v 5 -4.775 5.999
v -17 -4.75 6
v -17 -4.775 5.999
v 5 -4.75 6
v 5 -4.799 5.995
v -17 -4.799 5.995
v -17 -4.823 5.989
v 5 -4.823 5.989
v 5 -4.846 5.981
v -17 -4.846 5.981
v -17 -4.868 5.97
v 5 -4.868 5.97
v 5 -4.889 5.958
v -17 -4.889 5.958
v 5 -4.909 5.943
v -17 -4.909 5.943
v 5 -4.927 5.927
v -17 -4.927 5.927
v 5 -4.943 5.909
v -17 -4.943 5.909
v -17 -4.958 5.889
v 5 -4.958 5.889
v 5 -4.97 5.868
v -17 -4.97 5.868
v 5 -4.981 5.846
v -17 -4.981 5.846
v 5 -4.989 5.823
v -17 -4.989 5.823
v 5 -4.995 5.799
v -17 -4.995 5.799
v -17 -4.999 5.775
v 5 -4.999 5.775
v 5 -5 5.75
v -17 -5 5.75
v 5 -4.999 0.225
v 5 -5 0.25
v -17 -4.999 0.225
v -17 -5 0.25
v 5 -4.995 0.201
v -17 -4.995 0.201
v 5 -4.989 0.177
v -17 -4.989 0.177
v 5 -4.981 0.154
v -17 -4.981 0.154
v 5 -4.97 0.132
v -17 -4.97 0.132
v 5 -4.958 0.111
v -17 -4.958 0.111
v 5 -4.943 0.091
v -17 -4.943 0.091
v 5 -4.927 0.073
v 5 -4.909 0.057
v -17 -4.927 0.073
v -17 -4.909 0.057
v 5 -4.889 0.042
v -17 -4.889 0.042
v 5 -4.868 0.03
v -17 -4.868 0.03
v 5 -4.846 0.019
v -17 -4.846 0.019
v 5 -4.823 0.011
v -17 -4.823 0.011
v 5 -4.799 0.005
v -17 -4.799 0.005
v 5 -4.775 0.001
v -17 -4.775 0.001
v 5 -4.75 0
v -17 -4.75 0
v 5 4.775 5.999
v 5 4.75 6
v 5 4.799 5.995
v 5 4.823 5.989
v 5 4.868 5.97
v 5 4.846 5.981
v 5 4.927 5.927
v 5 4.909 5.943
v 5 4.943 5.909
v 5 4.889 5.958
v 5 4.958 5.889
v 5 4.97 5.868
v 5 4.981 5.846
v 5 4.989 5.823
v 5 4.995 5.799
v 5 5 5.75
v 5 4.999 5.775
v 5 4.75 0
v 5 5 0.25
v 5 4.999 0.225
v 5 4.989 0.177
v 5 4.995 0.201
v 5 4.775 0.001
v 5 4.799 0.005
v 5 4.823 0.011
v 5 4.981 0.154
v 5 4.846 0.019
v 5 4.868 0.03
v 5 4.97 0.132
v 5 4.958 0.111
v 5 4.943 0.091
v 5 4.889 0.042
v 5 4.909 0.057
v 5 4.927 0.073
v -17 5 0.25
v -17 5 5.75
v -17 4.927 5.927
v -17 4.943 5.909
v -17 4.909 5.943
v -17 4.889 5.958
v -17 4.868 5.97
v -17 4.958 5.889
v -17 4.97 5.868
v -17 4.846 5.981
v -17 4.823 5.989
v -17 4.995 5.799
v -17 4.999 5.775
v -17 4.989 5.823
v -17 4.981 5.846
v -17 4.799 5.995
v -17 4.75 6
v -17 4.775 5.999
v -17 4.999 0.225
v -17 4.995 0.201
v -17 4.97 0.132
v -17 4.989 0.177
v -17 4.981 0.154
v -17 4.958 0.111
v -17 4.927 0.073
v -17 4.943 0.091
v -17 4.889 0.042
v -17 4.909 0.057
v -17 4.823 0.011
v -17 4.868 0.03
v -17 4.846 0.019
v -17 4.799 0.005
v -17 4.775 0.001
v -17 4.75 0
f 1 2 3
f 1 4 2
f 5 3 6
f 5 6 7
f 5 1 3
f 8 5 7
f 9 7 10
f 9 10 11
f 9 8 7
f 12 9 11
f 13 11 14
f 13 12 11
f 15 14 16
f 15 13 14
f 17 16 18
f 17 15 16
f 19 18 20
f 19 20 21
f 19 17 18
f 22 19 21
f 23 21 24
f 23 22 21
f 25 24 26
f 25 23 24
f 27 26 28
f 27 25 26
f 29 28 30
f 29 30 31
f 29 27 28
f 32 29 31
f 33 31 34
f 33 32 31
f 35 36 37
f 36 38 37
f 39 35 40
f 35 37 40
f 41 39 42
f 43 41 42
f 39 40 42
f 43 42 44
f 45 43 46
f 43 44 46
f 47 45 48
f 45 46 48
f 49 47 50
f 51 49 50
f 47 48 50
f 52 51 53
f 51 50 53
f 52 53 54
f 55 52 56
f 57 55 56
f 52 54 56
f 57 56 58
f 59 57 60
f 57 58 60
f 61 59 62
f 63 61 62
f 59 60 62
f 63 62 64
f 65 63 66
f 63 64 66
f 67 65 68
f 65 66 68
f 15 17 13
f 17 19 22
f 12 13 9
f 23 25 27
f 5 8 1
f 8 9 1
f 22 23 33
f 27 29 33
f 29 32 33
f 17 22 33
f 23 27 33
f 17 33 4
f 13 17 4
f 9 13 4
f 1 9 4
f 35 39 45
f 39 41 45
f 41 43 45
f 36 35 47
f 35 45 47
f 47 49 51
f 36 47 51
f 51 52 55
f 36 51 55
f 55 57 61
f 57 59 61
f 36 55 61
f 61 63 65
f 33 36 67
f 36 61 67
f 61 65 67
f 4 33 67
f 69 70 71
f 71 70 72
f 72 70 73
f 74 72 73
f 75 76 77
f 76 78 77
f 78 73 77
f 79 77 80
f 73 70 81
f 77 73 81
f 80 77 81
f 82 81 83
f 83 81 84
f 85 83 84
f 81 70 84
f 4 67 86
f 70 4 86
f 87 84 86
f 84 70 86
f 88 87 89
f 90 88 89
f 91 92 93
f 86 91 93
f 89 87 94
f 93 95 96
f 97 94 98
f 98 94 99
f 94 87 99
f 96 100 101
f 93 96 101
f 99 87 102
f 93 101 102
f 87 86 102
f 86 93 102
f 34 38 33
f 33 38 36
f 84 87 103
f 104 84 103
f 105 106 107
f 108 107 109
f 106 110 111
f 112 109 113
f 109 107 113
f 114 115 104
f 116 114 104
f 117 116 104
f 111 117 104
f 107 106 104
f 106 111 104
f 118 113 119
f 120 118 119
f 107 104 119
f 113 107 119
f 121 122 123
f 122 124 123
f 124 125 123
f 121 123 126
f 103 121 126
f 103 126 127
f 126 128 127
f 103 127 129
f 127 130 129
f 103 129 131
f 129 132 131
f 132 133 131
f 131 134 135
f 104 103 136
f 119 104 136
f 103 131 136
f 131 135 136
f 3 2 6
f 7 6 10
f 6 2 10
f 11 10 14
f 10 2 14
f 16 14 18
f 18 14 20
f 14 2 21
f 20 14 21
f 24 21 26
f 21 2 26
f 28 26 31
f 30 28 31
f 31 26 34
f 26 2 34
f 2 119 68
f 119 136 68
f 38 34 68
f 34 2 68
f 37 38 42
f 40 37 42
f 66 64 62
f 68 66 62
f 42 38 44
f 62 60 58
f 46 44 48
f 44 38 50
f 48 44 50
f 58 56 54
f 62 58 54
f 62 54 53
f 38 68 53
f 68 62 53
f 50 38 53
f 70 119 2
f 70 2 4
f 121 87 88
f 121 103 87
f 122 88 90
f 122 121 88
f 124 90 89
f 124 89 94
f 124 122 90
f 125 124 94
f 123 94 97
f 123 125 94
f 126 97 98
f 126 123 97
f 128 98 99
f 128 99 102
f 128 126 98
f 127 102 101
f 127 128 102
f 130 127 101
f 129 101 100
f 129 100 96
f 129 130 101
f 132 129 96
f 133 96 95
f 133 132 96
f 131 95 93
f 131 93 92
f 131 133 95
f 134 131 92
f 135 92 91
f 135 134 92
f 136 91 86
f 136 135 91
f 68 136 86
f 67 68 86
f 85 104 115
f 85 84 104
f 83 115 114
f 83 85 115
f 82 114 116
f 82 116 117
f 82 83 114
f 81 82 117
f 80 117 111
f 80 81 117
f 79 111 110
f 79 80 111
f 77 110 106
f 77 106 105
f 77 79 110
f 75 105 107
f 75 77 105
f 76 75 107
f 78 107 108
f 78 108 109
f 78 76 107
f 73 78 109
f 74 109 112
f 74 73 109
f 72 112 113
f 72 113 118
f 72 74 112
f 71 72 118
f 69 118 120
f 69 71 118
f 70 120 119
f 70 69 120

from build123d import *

# Parameters (mm, degrees)
EXTRUDE1_DEPTH = 6
SKETCH2_W      = 22
SKETCH2_H      = 10
EXTRUDE2_DEPTH = 6
FILLET1_R      = 0.25


with BuildPart() as part:
    # Sketch1 → Extrude1 (new body)
    with BuildSketch(Plane.XY):
        with BuildLine():
            Line((0, 5), (-17, 5))
            Line((-17, 5), (-17, -5))
            Line((-17, -5), (0, -5))
            ThreePointArc((0, -5), (5, 0), (0, 5))
        make_face()
    extrude(amount=EXTRUDE1_DEPTH)

    # Sketch2 → Extrude2 (add)
    with BuildSketch(Plane.XY):
        with Locations((-6, 0)):
            Rectangle(SKETCH2_W, SKETCH2_H)
    extrude(amount=EXTRUDE2_DEPTH)

    # Fillet1
    fillet1_edges = [part.edges().sort_by_distance(p)[0] for p in [
        (-6, -5, 6),
        (-6, -5, 0),
        (-6, 5, 0),
        (-6, 5, 6),
    ]]
    fillet(fillet1_edges, radius=FILLET1_R)


solid = part.part
